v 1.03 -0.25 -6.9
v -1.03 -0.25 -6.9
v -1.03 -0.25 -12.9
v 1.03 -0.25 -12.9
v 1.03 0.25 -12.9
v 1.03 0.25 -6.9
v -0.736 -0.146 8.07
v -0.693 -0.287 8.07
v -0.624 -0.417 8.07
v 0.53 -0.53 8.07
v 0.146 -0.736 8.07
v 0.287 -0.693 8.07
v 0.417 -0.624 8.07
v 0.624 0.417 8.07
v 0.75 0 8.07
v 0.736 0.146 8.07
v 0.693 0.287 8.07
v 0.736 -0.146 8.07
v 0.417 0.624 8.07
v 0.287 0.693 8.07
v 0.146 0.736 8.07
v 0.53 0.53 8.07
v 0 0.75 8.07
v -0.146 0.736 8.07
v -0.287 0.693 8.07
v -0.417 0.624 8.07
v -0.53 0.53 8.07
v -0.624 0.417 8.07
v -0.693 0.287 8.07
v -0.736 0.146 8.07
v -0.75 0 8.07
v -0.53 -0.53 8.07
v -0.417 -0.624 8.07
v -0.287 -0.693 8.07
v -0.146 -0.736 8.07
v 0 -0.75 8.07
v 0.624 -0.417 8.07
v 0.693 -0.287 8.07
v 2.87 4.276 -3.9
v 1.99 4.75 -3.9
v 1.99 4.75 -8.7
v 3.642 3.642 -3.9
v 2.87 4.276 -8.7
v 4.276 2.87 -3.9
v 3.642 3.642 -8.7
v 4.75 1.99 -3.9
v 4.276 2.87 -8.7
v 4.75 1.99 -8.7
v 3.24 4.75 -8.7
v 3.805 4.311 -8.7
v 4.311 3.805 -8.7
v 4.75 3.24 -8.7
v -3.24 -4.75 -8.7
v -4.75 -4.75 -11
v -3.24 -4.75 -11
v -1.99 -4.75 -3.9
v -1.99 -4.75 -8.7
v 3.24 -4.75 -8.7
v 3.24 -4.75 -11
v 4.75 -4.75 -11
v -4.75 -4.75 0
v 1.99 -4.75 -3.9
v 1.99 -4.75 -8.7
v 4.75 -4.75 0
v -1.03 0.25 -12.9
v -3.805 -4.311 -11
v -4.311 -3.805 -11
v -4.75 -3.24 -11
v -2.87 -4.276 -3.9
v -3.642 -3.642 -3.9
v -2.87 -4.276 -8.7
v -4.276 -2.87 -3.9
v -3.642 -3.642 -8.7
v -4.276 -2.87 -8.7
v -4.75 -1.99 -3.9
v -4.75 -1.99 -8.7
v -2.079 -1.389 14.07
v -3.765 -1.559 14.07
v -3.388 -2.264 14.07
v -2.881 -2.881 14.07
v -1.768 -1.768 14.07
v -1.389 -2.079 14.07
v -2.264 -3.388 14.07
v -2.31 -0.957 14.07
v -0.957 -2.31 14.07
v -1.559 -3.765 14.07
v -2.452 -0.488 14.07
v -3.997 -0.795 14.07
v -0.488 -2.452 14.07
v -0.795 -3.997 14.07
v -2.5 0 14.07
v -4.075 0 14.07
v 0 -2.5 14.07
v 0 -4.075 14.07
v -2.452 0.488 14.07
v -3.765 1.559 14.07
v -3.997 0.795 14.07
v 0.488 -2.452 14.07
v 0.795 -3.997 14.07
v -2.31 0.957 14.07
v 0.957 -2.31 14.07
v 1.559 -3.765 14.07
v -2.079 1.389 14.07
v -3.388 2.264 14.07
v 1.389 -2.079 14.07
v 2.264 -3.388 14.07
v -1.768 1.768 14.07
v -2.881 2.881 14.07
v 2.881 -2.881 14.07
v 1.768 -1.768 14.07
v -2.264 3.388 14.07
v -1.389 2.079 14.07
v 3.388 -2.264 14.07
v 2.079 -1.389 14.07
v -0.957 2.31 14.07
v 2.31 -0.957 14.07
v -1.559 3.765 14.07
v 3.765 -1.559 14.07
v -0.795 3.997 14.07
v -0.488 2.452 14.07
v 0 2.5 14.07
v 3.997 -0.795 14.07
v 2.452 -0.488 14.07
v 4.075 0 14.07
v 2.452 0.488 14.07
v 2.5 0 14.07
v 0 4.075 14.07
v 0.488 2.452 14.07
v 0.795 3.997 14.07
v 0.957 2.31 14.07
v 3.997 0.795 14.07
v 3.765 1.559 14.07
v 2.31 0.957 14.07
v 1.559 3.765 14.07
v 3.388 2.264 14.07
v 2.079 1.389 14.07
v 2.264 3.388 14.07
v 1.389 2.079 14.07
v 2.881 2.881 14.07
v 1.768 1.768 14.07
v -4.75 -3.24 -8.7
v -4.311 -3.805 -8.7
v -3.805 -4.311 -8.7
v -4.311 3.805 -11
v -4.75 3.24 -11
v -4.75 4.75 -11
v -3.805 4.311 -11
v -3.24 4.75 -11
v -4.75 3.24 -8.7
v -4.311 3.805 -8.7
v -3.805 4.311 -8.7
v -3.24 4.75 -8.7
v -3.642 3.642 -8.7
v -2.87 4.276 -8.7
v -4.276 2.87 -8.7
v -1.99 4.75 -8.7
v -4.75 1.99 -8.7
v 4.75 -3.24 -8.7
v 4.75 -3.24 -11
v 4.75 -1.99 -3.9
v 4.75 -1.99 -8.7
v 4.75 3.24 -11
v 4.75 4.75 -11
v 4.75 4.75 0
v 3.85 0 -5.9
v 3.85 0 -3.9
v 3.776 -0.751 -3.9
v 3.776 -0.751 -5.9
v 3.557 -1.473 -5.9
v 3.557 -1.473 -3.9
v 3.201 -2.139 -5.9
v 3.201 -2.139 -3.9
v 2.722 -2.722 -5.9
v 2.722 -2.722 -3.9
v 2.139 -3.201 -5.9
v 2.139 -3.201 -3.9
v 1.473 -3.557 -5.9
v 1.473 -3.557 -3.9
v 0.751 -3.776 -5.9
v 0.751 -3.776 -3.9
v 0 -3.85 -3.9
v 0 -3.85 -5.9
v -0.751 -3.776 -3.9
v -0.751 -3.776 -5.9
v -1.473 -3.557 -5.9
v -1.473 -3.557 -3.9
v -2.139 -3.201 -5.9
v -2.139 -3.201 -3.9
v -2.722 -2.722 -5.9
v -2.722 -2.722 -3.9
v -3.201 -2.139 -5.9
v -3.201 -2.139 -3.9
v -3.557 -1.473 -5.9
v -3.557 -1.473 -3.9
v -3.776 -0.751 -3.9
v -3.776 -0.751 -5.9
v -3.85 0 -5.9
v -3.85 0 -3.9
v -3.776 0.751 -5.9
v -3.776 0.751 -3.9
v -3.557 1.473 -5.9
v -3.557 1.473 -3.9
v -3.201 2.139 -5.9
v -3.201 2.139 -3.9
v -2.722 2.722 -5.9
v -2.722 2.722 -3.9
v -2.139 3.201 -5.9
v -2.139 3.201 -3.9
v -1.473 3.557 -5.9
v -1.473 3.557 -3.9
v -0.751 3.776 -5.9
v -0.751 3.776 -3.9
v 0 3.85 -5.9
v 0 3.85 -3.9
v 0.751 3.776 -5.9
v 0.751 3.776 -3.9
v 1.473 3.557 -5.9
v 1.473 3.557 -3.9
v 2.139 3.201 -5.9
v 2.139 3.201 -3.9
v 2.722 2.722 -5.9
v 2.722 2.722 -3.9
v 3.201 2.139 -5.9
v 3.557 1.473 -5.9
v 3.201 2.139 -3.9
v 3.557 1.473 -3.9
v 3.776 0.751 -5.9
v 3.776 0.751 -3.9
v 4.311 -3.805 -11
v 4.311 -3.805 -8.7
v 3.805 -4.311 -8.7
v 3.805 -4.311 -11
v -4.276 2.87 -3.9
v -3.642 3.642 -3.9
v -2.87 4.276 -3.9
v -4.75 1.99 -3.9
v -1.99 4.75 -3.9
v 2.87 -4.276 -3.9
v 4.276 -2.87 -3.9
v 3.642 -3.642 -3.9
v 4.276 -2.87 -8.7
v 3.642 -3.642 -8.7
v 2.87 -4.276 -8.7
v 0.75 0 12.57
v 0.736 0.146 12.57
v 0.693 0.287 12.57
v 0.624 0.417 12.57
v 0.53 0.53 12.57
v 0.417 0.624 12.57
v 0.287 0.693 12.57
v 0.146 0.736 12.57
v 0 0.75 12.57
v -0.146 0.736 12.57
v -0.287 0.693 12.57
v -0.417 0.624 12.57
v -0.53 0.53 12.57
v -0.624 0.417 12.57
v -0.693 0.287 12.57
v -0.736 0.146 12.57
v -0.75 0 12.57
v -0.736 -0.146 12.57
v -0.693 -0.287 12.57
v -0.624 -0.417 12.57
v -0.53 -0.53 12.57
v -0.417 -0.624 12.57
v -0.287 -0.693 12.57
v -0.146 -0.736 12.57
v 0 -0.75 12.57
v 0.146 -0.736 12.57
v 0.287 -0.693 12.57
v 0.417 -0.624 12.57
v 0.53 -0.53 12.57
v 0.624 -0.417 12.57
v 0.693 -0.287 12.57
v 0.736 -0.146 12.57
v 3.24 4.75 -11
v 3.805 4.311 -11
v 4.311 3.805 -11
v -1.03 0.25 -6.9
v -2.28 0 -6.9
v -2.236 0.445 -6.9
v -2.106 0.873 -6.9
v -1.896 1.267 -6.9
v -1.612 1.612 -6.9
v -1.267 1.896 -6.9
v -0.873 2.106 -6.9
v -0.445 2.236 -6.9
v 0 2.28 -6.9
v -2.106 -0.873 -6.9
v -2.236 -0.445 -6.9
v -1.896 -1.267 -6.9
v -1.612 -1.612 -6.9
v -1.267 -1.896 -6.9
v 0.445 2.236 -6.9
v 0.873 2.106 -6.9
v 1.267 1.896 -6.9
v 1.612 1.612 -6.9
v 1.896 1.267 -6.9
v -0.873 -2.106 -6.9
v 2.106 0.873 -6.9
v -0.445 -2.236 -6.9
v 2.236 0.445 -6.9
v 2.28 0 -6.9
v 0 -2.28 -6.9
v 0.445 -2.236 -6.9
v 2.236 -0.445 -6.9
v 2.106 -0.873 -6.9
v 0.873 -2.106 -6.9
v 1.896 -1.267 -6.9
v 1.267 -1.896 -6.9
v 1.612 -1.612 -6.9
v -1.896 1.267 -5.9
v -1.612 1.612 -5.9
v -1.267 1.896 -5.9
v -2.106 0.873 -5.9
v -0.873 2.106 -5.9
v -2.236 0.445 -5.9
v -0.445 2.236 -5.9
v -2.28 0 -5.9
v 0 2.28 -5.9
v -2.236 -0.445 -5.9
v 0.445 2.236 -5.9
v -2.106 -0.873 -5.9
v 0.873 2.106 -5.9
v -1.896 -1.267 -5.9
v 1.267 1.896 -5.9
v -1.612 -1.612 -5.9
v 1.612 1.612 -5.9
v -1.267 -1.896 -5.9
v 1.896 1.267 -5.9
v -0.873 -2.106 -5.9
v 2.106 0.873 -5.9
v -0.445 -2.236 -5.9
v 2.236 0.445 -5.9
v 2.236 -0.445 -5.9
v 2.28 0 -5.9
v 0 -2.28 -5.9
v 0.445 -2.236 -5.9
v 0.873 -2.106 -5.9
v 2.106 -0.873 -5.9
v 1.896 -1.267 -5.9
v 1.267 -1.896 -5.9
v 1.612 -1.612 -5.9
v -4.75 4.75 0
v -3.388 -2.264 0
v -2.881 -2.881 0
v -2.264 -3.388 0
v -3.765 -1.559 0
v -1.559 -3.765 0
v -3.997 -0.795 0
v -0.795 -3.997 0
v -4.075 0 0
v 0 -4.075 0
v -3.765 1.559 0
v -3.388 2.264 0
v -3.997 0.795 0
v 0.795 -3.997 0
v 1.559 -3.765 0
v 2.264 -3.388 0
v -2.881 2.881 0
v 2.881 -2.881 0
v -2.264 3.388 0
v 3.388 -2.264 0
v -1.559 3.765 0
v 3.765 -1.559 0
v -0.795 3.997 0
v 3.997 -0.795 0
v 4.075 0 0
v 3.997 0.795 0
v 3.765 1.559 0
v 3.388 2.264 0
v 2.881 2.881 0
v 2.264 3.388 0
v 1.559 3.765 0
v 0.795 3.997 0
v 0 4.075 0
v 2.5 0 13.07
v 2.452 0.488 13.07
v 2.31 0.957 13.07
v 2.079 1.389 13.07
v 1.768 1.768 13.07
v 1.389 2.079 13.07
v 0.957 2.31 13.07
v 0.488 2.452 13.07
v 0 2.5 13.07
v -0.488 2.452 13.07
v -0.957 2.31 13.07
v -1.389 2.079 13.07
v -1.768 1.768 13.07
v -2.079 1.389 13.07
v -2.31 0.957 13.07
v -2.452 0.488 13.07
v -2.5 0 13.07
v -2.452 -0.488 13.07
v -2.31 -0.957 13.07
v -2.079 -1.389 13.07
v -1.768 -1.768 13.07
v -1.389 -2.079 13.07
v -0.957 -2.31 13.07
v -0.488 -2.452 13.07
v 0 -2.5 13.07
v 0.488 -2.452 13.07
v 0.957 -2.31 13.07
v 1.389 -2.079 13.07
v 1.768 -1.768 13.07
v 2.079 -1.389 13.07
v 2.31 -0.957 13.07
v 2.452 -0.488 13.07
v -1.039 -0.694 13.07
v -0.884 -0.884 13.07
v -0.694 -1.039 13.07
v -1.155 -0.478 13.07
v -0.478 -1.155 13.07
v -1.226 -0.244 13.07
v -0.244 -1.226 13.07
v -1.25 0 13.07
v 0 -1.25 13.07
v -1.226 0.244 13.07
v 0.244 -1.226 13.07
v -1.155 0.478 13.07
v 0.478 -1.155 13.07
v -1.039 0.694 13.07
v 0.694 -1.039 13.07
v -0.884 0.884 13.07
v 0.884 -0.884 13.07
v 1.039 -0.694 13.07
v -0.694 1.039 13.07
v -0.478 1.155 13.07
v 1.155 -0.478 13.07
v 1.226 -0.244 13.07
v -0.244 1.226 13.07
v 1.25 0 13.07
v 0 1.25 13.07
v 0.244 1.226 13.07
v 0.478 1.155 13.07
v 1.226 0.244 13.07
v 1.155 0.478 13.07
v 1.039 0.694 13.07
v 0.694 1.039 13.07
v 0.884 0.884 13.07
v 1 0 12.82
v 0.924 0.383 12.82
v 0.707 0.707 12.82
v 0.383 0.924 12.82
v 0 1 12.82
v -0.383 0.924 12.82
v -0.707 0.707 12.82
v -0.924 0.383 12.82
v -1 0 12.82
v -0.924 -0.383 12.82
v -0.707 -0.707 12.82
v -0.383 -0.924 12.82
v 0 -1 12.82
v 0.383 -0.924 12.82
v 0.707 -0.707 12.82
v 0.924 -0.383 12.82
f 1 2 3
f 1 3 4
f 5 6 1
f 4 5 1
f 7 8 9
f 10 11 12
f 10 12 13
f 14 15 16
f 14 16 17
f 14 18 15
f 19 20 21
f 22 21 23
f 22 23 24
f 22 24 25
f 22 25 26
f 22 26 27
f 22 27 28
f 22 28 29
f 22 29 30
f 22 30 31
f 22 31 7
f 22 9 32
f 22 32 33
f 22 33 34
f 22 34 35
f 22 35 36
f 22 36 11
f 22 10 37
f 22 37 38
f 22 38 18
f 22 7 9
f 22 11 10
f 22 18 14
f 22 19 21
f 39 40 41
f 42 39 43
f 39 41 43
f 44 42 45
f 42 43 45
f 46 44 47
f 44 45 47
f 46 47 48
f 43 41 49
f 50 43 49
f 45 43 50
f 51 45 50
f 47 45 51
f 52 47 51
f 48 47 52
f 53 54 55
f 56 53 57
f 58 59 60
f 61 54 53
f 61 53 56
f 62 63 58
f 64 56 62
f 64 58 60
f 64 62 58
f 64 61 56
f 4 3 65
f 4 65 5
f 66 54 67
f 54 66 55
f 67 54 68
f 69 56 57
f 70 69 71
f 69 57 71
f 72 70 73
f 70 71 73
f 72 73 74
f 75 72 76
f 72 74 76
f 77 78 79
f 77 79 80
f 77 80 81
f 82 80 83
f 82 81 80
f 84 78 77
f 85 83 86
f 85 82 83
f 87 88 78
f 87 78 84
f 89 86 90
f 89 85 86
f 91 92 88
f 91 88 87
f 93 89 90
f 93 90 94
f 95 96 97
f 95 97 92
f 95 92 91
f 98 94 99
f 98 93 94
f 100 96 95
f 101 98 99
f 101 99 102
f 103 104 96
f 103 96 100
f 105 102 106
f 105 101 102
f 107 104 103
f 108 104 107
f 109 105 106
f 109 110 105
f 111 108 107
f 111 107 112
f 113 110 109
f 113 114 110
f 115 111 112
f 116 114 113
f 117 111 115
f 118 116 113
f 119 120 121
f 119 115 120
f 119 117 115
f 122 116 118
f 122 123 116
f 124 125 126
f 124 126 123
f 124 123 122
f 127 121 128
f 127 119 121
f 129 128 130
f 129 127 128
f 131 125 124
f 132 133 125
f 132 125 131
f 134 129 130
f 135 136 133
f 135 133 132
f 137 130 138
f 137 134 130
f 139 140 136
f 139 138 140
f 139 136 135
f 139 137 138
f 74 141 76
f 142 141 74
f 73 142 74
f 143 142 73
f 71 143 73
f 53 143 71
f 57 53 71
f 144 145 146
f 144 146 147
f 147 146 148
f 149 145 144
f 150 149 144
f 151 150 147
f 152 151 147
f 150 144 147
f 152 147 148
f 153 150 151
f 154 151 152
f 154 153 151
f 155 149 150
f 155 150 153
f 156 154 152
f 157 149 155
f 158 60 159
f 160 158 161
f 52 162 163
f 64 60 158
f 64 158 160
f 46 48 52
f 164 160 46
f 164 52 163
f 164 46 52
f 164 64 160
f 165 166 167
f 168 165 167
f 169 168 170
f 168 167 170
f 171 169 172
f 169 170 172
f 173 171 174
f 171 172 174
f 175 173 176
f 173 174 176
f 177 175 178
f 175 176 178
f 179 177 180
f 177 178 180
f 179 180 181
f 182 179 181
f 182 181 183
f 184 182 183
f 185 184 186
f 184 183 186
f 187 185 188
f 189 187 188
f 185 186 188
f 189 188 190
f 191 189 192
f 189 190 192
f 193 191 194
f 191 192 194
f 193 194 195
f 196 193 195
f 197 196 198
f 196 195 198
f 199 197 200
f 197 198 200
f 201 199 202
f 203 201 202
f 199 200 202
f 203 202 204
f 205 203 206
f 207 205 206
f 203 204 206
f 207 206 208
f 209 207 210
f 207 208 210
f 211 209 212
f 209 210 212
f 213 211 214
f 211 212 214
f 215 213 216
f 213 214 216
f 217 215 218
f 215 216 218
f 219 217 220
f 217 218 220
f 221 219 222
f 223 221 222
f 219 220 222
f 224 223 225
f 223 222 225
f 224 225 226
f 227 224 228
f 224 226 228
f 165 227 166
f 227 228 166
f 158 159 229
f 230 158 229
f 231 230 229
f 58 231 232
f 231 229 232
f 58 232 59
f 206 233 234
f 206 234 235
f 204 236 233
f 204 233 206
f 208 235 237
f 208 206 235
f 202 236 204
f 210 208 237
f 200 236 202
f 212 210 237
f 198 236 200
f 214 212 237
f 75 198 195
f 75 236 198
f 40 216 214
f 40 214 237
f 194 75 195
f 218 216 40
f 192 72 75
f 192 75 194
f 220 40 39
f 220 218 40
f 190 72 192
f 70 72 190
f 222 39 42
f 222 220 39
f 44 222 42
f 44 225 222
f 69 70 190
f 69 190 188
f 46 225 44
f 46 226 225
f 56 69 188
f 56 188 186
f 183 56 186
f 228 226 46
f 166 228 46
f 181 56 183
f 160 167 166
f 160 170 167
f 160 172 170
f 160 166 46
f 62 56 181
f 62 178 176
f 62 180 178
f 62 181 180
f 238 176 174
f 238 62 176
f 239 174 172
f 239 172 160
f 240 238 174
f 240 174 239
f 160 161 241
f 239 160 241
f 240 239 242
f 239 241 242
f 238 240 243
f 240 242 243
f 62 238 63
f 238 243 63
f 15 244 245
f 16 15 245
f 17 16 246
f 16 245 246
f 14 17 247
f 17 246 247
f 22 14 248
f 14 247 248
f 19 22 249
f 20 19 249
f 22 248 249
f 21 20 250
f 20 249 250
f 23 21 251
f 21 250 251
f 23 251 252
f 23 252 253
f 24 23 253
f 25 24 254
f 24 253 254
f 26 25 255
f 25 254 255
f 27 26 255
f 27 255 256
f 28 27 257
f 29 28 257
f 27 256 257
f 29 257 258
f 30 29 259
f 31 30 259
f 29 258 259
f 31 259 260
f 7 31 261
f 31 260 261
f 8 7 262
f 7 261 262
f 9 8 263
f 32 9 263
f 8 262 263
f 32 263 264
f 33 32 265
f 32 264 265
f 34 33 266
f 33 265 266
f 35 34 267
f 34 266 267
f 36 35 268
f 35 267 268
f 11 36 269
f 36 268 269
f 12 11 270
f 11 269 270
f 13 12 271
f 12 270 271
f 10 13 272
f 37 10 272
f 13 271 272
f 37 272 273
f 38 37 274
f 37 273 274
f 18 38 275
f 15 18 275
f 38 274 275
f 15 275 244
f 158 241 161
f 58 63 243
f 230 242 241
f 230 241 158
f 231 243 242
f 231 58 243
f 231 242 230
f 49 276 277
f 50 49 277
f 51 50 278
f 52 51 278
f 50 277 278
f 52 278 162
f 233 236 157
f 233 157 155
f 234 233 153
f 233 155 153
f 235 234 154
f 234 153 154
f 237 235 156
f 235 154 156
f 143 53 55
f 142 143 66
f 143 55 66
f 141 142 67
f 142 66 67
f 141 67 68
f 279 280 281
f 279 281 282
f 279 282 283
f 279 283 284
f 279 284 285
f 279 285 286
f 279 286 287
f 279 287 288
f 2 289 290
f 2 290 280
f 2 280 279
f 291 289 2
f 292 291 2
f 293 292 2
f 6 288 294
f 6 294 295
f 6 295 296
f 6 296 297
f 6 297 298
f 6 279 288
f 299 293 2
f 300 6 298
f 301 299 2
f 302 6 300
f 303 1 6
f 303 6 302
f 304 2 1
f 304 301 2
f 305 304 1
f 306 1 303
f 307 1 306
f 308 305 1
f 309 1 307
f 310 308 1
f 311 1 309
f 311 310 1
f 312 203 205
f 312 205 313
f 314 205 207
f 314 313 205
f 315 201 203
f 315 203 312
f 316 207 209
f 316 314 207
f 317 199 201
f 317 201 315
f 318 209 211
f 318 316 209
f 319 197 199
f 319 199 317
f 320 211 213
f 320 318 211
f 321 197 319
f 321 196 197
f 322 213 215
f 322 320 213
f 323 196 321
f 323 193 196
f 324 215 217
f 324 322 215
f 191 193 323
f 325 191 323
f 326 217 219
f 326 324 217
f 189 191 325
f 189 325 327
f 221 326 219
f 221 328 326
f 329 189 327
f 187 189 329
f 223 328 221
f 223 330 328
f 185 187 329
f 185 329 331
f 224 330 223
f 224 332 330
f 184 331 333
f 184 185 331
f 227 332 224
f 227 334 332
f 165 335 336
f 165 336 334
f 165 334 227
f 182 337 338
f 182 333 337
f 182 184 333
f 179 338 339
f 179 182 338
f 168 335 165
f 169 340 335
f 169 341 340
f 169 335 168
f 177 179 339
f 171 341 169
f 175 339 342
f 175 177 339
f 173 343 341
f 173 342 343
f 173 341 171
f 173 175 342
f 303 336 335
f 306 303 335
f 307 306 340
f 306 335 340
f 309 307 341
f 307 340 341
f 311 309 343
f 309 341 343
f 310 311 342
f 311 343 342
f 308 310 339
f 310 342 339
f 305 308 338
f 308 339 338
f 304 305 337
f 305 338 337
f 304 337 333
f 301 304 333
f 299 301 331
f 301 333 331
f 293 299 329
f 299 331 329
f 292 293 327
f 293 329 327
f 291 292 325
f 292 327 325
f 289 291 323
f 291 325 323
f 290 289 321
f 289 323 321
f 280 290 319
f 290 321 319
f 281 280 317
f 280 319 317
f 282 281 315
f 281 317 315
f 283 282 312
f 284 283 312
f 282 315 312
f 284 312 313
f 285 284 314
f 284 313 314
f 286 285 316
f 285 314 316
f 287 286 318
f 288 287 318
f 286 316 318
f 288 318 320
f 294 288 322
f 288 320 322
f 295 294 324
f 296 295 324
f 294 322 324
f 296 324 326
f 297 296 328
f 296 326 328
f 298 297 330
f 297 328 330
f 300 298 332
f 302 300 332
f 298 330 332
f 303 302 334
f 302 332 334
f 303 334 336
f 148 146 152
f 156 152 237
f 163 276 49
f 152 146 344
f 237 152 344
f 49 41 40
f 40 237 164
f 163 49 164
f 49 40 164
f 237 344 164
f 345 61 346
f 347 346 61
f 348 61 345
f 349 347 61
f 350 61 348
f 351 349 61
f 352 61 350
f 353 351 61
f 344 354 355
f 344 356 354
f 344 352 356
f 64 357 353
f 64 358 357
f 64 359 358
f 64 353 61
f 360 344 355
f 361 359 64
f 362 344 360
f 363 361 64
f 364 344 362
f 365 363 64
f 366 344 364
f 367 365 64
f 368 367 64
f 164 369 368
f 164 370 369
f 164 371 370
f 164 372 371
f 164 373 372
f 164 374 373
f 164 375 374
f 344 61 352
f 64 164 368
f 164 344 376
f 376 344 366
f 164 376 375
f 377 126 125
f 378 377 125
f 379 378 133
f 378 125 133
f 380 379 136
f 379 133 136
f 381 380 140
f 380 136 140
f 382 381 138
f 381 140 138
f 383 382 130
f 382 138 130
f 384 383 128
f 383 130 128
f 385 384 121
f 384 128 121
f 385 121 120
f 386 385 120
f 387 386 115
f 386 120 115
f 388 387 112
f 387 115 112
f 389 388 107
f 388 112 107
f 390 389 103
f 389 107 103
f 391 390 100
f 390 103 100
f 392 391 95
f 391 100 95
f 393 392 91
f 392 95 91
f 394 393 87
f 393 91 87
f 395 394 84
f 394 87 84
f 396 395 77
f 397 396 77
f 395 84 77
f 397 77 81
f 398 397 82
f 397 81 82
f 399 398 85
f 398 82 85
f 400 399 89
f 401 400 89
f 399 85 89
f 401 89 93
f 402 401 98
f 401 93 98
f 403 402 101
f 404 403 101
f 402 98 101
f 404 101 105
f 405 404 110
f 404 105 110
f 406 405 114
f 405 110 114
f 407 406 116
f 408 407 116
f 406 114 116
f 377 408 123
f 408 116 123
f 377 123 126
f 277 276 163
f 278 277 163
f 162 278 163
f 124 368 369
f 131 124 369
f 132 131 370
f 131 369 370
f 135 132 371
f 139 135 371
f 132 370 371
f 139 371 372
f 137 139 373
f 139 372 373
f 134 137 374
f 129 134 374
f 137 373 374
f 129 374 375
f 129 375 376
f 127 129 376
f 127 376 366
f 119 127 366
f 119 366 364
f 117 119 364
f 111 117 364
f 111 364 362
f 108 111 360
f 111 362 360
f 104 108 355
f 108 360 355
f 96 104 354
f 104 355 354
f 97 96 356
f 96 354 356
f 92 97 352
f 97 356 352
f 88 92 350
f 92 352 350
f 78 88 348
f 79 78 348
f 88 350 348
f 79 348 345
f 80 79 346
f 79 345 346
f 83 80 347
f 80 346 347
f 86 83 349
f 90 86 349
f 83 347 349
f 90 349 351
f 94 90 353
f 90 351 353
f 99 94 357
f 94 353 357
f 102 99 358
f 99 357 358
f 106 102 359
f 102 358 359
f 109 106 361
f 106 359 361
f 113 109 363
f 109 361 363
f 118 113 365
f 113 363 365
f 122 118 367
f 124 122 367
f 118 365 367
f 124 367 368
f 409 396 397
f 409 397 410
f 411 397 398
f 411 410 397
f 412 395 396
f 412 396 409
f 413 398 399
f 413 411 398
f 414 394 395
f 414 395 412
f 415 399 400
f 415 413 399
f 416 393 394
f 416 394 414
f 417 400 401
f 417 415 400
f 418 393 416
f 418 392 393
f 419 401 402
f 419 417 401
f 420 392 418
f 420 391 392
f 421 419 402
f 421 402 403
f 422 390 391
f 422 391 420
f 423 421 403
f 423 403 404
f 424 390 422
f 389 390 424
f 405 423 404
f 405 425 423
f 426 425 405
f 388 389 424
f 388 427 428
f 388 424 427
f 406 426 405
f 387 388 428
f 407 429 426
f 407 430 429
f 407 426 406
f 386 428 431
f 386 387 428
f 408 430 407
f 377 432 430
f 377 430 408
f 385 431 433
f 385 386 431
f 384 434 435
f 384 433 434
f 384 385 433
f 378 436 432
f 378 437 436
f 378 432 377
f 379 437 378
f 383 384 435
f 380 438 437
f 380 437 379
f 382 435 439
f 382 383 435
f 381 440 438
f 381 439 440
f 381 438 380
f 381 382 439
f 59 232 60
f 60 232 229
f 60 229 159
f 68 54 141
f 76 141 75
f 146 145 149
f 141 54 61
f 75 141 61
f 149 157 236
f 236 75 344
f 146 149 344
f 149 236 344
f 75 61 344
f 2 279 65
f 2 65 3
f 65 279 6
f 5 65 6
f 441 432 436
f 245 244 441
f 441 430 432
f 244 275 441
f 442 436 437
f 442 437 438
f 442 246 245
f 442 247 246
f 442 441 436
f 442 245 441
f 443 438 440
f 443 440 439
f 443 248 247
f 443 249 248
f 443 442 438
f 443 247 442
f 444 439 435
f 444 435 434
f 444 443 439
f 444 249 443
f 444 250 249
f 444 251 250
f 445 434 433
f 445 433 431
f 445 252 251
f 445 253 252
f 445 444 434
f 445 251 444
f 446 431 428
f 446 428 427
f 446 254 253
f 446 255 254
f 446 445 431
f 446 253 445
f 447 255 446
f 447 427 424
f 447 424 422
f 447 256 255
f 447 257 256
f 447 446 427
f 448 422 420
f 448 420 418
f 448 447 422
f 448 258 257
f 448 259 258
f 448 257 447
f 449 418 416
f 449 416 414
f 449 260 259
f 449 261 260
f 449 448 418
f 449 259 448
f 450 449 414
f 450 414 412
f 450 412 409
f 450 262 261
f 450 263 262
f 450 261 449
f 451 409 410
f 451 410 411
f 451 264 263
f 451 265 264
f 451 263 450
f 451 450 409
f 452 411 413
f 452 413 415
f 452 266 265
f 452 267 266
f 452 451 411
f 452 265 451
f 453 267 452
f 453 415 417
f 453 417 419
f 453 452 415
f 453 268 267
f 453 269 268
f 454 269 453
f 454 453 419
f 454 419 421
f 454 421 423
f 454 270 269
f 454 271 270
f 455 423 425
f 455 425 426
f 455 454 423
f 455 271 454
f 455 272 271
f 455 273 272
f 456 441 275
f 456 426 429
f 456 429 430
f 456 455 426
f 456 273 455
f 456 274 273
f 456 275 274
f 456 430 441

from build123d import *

# Parameters (mm, degrees)
SKETCH_W        = 9.5
SKETCH_H        = 9.5
PAD_DEPTH       = 11
SKETCH001_R     = 4.075
PAD001_DEPTH    = 14.07
SKETCH005_R     = 5.75
POCKET002_DEPTH = 2.3
SKETCH006_R     = 5.15
POCKET003_DEPTH = 4.8
SKETCH007_R     = 2.5
POCKET_DEPTH    = 1
SKETCH008_R     = 0.75
POCKET004_DEPTH = 5
CHAMFER_SIZE    = 0.5
SKETCH009_R     = 3.85
PAD002_DEPTH    = 2
SKETCH010_R     = 2.28
PAD003_DEPTH    = 1
SKETCH011_W     = 2.06
SKETCH011_H     = 0.5
PAD004_DEPTH    = 6


with BuildPart() as part:
    # Sketch → Pad (new body)
    with BuildSketch(Plane.XY):
        Rectangle(SKETCH_W, SKETCH_H)
    extrude(amount=-PAD_DEPTH)

    # Sketch001 (on Face5 of Pad) → Pad001 (join)
    with BuildSketch(Plane.XY):
        Circle(SKETCH001_R)
    extrude(amount=PAD001_DEPTH)

    # Sketch005 → Pocket002 (cut)
    with BuildSketch(Plane(origin=(0, 0, -11), x_dir=(1, 0, 0), z_dir=(0, 0, -1))):
        Circle(SKETCH005_R)
    extrude(amount=-POCKET002_DEPTH, mode=Mode.SUBTRACT)

    # Sketch006 (on Face6 of Pocket002) → Pocket003 (cut)
    with BuildSketch(Plane(origin=(0, 0, -8.7), x_dir=(1, 0, 0), z_dir=(0, 0, -1))):
        Circle(SKETCH006_R)
    extrude(amount=-POCKET003_DEPTH, mode=Mode.SUBTRACT)

    # Sketch007 (on Face24 of Pocket003) → Pocket (cut)
    with BuildSketch(Plane.XY.offset(14.07)):
        Circle(SKETCH007_R)
    extrude(amount=-POCKET_DEPTH, mode=Mode.SUBTRACT)

    # Sketch008 (on Face26 of Pocket) → Pocket004 (cut)
    with BuildSketch(Plane.XY.offset(13.07)):
        Circle(SKETCH008_R)
    extrude(amount=-POCKET004_DEPTH, mode=Mode.SUBTRACT)

    # Chamfer
    chamfer_edges = [part.edges().sort_by_distance(p)[0] for p in [
        (-0.75, 0, 13.07),
    ]]
    chamfer(chamfer_edges, length=CHAMFER_SIZE)

    # Sketch009 (on Face17 of Chamfer) → Pad002 (join)
    with BuildSketch(Plane(origin=(0, 0, -3.9), x_dir=(1, 0, 0), z_dir=(0, 0, -1))):
        Circle(SKETCH009_R)
    extrude(amount=PAD002_DEPTH)

    # Sketch010 (on Face31 of Pad002) → Pad003 (join)
    with BuildSketch(Plane(origin=(0, 0, -5.9), x_dir=(1, 0, 0), z_dir=(0, 0, -1))):
        Circle(SKETCH010_R)
    extrude(amount=PAD003_DEPTH)

    # Sketch011 (on Face33 of Pad003) → Pad004 (join)
    with BuildSketch(Plane(origin=(0, 0, -6.9), x_dir=(1, 0, 0), z_dir=(0, 0, -1))):
        Rectangle(SKETCH011_W, SKETCH011_H)
    extrude(amount=PAD004_DEPTH)


solid = part.part
